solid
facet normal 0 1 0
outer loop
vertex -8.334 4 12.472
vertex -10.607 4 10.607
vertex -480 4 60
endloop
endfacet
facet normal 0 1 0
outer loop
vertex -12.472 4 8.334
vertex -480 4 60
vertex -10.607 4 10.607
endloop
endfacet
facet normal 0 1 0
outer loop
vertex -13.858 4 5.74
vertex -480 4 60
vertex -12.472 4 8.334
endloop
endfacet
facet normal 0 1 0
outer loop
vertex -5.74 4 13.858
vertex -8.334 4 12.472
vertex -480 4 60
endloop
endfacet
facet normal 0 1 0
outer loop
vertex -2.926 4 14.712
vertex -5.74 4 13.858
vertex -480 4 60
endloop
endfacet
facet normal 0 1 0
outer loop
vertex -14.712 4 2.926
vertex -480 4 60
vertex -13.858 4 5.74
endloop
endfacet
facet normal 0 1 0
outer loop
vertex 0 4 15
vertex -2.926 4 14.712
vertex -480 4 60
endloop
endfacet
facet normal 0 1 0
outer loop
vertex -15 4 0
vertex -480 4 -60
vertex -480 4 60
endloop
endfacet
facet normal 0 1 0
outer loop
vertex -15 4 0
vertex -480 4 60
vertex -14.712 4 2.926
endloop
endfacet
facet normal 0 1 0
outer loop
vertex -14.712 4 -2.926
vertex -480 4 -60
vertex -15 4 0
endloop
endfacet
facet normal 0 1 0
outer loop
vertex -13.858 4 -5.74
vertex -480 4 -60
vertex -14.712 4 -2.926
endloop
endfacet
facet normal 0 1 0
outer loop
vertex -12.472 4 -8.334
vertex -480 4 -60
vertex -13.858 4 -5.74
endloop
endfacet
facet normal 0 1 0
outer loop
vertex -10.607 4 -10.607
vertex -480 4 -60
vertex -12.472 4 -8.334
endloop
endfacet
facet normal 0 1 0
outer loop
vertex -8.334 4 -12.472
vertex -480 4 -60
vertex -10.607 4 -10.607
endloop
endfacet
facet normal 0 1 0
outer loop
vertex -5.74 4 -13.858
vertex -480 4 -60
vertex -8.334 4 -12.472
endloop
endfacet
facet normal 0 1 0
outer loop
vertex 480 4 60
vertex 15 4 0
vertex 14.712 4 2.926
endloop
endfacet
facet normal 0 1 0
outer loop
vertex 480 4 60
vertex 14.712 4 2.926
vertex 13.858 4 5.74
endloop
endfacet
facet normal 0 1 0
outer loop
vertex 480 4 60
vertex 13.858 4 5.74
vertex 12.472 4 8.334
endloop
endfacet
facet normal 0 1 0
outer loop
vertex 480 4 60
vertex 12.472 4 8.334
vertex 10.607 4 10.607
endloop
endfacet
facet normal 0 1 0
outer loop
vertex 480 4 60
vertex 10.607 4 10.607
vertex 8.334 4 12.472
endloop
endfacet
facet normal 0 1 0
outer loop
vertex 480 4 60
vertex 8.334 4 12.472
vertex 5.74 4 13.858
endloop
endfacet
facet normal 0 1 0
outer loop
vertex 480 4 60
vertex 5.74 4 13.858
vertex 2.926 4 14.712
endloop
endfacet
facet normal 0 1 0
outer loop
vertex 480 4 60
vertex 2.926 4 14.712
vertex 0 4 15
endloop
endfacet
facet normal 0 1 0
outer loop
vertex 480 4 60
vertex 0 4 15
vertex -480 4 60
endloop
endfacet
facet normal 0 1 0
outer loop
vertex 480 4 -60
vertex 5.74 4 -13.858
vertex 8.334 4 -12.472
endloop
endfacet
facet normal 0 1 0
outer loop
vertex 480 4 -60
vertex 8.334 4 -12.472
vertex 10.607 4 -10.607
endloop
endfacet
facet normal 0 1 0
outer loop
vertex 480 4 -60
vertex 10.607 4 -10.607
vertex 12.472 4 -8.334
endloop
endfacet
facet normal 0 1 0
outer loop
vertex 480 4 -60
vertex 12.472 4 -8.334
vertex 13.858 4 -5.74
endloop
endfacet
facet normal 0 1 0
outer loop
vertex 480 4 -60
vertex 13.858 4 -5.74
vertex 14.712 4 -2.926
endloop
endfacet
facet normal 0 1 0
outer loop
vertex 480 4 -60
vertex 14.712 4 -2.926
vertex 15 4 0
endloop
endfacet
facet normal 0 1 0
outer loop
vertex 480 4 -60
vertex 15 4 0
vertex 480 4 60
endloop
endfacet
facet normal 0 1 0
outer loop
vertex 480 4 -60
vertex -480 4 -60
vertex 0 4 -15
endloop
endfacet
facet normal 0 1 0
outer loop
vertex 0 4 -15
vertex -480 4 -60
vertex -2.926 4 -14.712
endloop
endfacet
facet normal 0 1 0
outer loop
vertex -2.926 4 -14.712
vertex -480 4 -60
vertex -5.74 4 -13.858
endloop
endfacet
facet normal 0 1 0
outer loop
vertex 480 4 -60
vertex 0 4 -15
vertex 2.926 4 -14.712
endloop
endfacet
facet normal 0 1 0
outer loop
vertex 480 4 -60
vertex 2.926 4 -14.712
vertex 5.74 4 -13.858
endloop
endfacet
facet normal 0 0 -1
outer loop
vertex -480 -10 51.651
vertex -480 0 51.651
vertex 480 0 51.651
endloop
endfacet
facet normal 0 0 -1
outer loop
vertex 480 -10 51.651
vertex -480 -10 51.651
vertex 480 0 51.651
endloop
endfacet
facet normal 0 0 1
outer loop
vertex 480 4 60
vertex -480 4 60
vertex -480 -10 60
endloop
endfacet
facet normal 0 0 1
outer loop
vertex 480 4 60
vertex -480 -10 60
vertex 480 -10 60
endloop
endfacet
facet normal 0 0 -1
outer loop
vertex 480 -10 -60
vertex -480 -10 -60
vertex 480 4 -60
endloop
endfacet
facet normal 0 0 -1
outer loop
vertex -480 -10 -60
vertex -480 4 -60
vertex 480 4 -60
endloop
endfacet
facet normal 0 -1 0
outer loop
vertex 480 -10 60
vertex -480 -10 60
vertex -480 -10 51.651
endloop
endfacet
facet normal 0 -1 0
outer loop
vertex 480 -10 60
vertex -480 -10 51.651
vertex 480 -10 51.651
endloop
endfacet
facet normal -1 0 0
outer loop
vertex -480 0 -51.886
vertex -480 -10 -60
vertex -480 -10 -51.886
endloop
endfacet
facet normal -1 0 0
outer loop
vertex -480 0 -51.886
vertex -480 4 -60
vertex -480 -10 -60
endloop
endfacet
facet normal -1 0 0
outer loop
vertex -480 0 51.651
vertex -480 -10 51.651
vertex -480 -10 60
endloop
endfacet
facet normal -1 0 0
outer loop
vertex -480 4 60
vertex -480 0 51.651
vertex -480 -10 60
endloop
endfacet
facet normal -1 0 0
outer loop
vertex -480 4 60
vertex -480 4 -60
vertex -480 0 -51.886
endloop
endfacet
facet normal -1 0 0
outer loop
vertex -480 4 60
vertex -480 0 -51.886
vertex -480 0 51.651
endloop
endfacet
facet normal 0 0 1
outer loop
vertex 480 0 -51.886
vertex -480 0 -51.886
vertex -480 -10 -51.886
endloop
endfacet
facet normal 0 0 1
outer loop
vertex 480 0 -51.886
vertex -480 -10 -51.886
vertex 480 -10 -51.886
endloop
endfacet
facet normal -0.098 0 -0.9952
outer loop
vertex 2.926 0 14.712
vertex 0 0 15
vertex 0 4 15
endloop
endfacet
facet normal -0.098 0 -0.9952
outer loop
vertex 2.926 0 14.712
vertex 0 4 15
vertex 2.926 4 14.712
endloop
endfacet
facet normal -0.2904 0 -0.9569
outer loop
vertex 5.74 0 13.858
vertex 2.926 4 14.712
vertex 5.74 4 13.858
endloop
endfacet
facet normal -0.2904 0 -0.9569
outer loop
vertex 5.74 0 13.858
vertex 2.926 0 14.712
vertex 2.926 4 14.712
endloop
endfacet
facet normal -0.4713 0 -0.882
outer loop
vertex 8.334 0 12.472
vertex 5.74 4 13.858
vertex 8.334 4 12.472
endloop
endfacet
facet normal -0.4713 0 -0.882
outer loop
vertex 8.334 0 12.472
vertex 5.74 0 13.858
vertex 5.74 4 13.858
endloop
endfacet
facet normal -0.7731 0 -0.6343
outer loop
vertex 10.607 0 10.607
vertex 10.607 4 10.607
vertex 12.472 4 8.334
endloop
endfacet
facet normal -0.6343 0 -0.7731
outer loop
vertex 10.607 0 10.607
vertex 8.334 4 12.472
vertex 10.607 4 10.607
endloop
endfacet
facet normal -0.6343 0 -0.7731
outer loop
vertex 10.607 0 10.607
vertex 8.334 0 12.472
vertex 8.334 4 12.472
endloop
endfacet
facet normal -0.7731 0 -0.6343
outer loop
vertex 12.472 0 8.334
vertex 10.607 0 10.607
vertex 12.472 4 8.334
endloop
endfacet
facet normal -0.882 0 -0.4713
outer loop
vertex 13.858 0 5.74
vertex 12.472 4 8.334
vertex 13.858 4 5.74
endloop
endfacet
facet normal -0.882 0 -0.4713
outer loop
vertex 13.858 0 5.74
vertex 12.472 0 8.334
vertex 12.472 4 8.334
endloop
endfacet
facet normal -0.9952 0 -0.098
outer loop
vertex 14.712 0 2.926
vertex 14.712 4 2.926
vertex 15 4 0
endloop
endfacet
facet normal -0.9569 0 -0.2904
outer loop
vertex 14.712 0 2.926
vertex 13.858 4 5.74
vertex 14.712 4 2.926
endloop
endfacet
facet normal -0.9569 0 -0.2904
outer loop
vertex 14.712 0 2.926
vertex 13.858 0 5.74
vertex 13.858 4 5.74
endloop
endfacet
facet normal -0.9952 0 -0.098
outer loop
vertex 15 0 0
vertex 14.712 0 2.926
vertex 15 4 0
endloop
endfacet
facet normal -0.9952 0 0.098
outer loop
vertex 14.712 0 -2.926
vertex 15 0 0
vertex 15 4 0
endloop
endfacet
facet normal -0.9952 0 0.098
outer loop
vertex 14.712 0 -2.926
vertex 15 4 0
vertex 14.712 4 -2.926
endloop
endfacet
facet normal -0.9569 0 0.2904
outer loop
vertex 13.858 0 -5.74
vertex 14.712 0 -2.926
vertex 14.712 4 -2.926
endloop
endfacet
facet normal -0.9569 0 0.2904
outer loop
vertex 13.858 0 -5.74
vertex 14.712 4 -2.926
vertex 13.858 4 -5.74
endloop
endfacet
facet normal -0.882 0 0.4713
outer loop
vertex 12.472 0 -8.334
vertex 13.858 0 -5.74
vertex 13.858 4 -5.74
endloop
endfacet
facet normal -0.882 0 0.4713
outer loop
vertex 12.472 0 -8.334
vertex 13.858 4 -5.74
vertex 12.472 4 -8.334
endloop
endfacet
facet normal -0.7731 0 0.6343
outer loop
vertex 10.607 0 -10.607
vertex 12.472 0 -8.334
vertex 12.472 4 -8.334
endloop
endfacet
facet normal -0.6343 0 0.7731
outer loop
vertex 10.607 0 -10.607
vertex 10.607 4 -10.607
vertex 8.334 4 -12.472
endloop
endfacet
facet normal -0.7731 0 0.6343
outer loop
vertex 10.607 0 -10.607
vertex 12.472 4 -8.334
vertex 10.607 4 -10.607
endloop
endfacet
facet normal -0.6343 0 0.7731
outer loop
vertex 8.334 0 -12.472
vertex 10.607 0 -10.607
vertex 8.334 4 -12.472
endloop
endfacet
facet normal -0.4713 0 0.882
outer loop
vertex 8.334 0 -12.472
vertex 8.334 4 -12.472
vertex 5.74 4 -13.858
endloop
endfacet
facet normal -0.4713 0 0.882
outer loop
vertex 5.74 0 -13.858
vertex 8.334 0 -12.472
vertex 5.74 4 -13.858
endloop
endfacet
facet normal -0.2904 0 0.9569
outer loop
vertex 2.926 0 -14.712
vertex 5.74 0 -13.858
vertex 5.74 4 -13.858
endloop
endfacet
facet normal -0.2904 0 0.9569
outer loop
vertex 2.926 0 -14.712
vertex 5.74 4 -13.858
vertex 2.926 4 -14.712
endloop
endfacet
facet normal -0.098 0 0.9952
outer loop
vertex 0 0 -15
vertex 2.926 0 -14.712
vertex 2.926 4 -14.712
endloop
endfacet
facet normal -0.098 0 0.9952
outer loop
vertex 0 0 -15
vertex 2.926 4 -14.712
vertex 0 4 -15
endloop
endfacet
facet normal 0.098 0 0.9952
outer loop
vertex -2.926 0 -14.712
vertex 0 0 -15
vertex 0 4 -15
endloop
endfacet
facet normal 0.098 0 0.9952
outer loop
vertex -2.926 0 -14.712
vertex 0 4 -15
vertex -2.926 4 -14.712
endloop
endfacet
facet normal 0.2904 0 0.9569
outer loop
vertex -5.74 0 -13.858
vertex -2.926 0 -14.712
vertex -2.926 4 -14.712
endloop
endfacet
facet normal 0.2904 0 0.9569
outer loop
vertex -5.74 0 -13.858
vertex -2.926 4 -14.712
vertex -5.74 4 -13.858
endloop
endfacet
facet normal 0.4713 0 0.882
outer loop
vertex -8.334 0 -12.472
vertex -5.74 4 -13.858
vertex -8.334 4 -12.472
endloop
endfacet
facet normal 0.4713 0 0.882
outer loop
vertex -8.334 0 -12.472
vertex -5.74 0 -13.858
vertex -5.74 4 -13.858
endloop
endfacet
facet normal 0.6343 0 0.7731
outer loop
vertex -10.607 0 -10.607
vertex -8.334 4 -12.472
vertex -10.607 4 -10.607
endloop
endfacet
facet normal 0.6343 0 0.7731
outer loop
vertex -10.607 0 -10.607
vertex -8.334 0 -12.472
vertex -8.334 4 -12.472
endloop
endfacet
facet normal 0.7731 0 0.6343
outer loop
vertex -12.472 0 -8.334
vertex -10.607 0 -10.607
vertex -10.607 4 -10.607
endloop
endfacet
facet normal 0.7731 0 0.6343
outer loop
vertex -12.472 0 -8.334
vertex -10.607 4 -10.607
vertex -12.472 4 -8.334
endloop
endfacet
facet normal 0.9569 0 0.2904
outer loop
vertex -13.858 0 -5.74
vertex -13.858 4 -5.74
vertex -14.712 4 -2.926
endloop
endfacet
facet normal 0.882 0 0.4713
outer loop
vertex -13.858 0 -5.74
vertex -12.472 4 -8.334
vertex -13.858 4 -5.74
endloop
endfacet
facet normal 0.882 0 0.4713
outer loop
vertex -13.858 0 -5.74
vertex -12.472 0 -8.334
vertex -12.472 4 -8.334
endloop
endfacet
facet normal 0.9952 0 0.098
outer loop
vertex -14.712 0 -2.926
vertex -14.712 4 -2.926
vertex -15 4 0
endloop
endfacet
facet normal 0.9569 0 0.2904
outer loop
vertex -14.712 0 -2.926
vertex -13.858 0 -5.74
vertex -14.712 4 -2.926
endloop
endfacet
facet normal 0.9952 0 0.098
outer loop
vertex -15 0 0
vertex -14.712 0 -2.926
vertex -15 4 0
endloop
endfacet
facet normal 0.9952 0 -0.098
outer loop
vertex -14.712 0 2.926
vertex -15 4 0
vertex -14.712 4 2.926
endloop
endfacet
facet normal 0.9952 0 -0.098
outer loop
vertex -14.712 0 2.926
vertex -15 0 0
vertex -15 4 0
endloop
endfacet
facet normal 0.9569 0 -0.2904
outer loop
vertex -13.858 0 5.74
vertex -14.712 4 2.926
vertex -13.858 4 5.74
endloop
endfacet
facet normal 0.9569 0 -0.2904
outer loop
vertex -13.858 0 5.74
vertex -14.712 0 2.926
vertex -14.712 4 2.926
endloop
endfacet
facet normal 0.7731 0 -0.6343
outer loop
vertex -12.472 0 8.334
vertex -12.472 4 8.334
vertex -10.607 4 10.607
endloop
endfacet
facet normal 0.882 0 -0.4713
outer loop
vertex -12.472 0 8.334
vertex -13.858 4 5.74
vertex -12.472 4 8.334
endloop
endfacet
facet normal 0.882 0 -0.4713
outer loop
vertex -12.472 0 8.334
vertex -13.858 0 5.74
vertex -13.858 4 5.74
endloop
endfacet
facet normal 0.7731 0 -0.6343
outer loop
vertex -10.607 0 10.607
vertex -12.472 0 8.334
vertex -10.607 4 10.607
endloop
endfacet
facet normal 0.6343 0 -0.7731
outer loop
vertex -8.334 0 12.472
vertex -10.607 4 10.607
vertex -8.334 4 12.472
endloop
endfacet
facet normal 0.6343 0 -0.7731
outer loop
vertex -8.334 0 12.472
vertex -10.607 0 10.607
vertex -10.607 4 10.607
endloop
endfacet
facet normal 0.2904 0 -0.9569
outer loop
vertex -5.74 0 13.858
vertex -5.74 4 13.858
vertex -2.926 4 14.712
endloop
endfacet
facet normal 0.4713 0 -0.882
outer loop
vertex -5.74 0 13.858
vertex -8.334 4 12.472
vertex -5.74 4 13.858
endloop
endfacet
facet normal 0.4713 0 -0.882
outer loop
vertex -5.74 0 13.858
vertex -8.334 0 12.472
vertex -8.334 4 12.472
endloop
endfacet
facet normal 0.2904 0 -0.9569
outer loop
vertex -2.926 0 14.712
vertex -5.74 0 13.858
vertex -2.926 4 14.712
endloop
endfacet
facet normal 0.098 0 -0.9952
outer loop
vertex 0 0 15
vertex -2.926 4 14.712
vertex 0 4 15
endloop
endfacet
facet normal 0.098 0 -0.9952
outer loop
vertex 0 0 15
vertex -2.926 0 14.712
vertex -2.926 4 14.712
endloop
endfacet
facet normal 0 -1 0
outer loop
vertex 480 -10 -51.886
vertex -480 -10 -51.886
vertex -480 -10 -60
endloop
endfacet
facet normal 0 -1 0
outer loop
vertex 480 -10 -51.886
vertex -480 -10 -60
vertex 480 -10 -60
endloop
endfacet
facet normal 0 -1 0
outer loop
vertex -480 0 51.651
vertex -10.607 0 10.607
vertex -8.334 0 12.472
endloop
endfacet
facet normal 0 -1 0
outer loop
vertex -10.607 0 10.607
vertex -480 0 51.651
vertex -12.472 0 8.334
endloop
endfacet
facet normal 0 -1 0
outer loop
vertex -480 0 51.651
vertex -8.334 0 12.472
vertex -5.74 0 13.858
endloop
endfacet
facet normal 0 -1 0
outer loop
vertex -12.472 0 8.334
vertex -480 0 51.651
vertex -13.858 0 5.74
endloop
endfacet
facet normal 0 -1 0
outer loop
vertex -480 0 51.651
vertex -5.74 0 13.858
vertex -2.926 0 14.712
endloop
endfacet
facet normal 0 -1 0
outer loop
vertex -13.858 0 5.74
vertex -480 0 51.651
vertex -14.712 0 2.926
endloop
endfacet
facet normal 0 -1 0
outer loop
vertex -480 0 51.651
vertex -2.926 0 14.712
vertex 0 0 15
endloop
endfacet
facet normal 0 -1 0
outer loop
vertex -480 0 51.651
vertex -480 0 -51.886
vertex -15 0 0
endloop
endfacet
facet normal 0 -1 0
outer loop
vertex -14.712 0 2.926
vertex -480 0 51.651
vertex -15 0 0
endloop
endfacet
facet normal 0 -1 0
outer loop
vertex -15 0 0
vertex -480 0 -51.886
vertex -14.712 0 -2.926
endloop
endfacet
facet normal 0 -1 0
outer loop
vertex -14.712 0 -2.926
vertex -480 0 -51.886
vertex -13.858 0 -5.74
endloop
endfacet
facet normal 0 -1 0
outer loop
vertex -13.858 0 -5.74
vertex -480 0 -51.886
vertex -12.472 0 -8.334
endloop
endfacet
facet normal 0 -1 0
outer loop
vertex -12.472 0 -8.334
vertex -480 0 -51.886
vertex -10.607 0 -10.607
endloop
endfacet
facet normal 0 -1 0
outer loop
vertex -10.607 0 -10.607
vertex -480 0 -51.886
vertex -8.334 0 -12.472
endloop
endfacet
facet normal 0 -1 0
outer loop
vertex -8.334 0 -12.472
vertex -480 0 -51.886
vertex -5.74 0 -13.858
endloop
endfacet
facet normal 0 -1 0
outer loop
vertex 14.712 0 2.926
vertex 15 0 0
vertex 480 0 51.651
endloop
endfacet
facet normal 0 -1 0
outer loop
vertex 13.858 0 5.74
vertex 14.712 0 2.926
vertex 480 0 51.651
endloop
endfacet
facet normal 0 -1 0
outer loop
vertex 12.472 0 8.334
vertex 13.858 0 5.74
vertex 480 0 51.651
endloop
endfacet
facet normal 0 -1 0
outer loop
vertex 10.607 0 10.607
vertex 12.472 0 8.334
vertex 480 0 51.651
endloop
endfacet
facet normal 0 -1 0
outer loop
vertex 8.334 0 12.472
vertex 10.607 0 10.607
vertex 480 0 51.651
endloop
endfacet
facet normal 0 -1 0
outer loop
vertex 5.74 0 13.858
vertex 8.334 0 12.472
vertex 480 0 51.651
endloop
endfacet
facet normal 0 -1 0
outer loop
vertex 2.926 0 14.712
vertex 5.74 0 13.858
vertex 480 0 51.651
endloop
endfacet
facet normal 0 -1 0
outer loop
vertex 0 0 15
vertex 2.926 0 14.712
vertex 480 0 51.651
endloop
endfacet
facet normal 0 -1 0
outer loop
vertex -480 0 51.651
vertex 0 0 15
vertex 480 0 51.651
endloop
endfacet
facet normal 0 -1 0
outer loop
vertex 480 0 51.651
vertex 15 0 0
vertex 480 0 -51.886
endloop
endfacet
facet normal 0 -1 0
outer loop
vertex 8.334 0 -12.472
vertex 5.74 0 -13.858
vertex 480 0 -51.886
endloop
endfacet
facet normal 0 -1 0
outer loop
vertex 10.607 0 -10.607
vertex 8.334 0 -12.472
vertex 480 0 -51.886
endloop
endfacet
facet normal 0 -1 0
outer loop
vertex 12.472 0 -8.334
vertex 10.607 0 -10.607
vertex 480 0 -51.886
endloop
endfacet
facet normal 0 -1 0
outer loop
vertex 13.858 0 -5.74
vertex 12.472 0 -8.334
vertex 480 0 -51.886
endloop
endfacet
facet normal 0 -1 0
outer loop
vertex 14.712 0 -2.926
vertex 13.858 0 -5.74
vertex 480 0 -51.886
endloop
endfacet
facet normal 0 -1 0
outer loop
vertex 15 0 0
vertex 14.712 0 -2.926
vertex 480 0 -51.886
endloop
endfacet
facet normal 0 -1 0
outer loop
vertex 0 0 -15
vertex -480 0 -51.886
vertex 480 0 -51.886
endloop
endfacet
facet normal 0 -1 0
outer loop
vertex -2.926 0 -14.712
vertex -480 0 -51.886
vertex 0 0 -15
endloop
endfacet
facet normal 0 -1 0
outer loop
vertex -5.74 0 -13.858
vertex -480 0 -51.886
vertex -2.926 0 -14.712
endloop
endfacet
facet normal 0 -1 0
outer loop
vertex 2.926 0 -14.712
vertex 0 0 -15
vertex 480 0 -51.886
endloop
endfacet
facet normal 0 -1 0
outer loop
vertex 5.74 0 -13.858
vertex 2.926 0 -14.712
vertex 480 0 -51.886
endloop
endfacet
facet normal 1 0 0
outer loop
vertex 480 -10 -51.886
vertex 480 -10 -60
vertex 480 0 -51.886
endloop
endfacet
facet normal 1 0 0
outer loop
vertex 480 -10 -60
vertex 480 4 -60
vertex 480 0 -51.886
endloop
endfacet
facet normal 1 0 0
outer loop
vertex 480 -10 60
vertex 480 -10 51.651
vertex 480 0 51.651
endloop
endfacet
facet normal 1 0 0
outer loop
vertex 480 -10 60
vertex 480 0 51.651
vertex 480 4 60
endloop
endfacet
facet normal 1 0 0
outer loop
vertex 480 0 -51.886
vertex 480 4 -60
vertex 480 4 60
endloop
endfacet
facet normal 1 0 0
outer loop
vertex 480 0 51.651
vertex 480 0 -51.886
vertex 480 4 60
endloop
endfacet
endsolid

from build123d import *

# Parameters (mm, degrees)
SKETCH1_W               = 960
SKETCH1_H               = 120
BOSS_EXTRUDE1_DEPTH     = 4
CUT_EXTRUDE1_DEPTH      = 24
CUT_EXTRUDE1_DEPTH_BACK = 13
SKETCH2_R               = 15
SKETCH3_W               = 960
SKETCH3_H               = 8.349001696
BOSS_EXTRUDE2_DEPTH     = 10
SKETCH4_W               = 960
SKETCH4_H               = 8.113720408
BOSS_EXTRUDE3_DEPTH     = 10


with BuildPart() as part:
    # Sketch1 → Boss-Extrude1 (new body)
    with BuildSketch(Plane(origin=(0, 0, 0), x_dir=(1, 0, 0), z_dir=(0, 1, 0))):
        Rectangle(SKETCH1_W, SKETCH1_H)
    extrude(amount=BOSS_EXTRUDE1_DEPTH)

    # Sketch2 → Cut-Extrude1 (cut, two sides: drawn at the far end of the back side and taken through both)
    with BuildSketch(Plane(origin=(0, 4, 0), x_dir=(1, 0, 0), z_dir=(0, 1, 0)).offset(-CUT_EXTRUDE1_DEPTH_BACK)):
        with Locations(Location((0, 0, 0), (0, 0, 270))):
            Circle(SKETCH2_R)
    extrude(amount=CUT_EXTRUDE1_DEPTH + CUT_EXTRUDE1_DEPTH_BACK, mode=Mode.SUBTRACT)

    # Sketch3 → Boss-Extrude2 (add)
    with BuildSketch(Plane.XZ):
        with Locations((0, 55.825499152)):
            Rectangle(SKETCH3_W, SKETCH3_H)
    extrude(amount=BOSS_EXTRUDE2_DEPTH)

    # Sketch4 → Boss-Extrude3 (add)
    with BuildSketch(Plane.XZ):
        with Locations((0, -55.943139796)):
            Rectangle(SKETCH4_W, SKETCH4_H)
    extrude(amount=BOSS_EXTRUDE3_DEPTH)


solid = part.part
